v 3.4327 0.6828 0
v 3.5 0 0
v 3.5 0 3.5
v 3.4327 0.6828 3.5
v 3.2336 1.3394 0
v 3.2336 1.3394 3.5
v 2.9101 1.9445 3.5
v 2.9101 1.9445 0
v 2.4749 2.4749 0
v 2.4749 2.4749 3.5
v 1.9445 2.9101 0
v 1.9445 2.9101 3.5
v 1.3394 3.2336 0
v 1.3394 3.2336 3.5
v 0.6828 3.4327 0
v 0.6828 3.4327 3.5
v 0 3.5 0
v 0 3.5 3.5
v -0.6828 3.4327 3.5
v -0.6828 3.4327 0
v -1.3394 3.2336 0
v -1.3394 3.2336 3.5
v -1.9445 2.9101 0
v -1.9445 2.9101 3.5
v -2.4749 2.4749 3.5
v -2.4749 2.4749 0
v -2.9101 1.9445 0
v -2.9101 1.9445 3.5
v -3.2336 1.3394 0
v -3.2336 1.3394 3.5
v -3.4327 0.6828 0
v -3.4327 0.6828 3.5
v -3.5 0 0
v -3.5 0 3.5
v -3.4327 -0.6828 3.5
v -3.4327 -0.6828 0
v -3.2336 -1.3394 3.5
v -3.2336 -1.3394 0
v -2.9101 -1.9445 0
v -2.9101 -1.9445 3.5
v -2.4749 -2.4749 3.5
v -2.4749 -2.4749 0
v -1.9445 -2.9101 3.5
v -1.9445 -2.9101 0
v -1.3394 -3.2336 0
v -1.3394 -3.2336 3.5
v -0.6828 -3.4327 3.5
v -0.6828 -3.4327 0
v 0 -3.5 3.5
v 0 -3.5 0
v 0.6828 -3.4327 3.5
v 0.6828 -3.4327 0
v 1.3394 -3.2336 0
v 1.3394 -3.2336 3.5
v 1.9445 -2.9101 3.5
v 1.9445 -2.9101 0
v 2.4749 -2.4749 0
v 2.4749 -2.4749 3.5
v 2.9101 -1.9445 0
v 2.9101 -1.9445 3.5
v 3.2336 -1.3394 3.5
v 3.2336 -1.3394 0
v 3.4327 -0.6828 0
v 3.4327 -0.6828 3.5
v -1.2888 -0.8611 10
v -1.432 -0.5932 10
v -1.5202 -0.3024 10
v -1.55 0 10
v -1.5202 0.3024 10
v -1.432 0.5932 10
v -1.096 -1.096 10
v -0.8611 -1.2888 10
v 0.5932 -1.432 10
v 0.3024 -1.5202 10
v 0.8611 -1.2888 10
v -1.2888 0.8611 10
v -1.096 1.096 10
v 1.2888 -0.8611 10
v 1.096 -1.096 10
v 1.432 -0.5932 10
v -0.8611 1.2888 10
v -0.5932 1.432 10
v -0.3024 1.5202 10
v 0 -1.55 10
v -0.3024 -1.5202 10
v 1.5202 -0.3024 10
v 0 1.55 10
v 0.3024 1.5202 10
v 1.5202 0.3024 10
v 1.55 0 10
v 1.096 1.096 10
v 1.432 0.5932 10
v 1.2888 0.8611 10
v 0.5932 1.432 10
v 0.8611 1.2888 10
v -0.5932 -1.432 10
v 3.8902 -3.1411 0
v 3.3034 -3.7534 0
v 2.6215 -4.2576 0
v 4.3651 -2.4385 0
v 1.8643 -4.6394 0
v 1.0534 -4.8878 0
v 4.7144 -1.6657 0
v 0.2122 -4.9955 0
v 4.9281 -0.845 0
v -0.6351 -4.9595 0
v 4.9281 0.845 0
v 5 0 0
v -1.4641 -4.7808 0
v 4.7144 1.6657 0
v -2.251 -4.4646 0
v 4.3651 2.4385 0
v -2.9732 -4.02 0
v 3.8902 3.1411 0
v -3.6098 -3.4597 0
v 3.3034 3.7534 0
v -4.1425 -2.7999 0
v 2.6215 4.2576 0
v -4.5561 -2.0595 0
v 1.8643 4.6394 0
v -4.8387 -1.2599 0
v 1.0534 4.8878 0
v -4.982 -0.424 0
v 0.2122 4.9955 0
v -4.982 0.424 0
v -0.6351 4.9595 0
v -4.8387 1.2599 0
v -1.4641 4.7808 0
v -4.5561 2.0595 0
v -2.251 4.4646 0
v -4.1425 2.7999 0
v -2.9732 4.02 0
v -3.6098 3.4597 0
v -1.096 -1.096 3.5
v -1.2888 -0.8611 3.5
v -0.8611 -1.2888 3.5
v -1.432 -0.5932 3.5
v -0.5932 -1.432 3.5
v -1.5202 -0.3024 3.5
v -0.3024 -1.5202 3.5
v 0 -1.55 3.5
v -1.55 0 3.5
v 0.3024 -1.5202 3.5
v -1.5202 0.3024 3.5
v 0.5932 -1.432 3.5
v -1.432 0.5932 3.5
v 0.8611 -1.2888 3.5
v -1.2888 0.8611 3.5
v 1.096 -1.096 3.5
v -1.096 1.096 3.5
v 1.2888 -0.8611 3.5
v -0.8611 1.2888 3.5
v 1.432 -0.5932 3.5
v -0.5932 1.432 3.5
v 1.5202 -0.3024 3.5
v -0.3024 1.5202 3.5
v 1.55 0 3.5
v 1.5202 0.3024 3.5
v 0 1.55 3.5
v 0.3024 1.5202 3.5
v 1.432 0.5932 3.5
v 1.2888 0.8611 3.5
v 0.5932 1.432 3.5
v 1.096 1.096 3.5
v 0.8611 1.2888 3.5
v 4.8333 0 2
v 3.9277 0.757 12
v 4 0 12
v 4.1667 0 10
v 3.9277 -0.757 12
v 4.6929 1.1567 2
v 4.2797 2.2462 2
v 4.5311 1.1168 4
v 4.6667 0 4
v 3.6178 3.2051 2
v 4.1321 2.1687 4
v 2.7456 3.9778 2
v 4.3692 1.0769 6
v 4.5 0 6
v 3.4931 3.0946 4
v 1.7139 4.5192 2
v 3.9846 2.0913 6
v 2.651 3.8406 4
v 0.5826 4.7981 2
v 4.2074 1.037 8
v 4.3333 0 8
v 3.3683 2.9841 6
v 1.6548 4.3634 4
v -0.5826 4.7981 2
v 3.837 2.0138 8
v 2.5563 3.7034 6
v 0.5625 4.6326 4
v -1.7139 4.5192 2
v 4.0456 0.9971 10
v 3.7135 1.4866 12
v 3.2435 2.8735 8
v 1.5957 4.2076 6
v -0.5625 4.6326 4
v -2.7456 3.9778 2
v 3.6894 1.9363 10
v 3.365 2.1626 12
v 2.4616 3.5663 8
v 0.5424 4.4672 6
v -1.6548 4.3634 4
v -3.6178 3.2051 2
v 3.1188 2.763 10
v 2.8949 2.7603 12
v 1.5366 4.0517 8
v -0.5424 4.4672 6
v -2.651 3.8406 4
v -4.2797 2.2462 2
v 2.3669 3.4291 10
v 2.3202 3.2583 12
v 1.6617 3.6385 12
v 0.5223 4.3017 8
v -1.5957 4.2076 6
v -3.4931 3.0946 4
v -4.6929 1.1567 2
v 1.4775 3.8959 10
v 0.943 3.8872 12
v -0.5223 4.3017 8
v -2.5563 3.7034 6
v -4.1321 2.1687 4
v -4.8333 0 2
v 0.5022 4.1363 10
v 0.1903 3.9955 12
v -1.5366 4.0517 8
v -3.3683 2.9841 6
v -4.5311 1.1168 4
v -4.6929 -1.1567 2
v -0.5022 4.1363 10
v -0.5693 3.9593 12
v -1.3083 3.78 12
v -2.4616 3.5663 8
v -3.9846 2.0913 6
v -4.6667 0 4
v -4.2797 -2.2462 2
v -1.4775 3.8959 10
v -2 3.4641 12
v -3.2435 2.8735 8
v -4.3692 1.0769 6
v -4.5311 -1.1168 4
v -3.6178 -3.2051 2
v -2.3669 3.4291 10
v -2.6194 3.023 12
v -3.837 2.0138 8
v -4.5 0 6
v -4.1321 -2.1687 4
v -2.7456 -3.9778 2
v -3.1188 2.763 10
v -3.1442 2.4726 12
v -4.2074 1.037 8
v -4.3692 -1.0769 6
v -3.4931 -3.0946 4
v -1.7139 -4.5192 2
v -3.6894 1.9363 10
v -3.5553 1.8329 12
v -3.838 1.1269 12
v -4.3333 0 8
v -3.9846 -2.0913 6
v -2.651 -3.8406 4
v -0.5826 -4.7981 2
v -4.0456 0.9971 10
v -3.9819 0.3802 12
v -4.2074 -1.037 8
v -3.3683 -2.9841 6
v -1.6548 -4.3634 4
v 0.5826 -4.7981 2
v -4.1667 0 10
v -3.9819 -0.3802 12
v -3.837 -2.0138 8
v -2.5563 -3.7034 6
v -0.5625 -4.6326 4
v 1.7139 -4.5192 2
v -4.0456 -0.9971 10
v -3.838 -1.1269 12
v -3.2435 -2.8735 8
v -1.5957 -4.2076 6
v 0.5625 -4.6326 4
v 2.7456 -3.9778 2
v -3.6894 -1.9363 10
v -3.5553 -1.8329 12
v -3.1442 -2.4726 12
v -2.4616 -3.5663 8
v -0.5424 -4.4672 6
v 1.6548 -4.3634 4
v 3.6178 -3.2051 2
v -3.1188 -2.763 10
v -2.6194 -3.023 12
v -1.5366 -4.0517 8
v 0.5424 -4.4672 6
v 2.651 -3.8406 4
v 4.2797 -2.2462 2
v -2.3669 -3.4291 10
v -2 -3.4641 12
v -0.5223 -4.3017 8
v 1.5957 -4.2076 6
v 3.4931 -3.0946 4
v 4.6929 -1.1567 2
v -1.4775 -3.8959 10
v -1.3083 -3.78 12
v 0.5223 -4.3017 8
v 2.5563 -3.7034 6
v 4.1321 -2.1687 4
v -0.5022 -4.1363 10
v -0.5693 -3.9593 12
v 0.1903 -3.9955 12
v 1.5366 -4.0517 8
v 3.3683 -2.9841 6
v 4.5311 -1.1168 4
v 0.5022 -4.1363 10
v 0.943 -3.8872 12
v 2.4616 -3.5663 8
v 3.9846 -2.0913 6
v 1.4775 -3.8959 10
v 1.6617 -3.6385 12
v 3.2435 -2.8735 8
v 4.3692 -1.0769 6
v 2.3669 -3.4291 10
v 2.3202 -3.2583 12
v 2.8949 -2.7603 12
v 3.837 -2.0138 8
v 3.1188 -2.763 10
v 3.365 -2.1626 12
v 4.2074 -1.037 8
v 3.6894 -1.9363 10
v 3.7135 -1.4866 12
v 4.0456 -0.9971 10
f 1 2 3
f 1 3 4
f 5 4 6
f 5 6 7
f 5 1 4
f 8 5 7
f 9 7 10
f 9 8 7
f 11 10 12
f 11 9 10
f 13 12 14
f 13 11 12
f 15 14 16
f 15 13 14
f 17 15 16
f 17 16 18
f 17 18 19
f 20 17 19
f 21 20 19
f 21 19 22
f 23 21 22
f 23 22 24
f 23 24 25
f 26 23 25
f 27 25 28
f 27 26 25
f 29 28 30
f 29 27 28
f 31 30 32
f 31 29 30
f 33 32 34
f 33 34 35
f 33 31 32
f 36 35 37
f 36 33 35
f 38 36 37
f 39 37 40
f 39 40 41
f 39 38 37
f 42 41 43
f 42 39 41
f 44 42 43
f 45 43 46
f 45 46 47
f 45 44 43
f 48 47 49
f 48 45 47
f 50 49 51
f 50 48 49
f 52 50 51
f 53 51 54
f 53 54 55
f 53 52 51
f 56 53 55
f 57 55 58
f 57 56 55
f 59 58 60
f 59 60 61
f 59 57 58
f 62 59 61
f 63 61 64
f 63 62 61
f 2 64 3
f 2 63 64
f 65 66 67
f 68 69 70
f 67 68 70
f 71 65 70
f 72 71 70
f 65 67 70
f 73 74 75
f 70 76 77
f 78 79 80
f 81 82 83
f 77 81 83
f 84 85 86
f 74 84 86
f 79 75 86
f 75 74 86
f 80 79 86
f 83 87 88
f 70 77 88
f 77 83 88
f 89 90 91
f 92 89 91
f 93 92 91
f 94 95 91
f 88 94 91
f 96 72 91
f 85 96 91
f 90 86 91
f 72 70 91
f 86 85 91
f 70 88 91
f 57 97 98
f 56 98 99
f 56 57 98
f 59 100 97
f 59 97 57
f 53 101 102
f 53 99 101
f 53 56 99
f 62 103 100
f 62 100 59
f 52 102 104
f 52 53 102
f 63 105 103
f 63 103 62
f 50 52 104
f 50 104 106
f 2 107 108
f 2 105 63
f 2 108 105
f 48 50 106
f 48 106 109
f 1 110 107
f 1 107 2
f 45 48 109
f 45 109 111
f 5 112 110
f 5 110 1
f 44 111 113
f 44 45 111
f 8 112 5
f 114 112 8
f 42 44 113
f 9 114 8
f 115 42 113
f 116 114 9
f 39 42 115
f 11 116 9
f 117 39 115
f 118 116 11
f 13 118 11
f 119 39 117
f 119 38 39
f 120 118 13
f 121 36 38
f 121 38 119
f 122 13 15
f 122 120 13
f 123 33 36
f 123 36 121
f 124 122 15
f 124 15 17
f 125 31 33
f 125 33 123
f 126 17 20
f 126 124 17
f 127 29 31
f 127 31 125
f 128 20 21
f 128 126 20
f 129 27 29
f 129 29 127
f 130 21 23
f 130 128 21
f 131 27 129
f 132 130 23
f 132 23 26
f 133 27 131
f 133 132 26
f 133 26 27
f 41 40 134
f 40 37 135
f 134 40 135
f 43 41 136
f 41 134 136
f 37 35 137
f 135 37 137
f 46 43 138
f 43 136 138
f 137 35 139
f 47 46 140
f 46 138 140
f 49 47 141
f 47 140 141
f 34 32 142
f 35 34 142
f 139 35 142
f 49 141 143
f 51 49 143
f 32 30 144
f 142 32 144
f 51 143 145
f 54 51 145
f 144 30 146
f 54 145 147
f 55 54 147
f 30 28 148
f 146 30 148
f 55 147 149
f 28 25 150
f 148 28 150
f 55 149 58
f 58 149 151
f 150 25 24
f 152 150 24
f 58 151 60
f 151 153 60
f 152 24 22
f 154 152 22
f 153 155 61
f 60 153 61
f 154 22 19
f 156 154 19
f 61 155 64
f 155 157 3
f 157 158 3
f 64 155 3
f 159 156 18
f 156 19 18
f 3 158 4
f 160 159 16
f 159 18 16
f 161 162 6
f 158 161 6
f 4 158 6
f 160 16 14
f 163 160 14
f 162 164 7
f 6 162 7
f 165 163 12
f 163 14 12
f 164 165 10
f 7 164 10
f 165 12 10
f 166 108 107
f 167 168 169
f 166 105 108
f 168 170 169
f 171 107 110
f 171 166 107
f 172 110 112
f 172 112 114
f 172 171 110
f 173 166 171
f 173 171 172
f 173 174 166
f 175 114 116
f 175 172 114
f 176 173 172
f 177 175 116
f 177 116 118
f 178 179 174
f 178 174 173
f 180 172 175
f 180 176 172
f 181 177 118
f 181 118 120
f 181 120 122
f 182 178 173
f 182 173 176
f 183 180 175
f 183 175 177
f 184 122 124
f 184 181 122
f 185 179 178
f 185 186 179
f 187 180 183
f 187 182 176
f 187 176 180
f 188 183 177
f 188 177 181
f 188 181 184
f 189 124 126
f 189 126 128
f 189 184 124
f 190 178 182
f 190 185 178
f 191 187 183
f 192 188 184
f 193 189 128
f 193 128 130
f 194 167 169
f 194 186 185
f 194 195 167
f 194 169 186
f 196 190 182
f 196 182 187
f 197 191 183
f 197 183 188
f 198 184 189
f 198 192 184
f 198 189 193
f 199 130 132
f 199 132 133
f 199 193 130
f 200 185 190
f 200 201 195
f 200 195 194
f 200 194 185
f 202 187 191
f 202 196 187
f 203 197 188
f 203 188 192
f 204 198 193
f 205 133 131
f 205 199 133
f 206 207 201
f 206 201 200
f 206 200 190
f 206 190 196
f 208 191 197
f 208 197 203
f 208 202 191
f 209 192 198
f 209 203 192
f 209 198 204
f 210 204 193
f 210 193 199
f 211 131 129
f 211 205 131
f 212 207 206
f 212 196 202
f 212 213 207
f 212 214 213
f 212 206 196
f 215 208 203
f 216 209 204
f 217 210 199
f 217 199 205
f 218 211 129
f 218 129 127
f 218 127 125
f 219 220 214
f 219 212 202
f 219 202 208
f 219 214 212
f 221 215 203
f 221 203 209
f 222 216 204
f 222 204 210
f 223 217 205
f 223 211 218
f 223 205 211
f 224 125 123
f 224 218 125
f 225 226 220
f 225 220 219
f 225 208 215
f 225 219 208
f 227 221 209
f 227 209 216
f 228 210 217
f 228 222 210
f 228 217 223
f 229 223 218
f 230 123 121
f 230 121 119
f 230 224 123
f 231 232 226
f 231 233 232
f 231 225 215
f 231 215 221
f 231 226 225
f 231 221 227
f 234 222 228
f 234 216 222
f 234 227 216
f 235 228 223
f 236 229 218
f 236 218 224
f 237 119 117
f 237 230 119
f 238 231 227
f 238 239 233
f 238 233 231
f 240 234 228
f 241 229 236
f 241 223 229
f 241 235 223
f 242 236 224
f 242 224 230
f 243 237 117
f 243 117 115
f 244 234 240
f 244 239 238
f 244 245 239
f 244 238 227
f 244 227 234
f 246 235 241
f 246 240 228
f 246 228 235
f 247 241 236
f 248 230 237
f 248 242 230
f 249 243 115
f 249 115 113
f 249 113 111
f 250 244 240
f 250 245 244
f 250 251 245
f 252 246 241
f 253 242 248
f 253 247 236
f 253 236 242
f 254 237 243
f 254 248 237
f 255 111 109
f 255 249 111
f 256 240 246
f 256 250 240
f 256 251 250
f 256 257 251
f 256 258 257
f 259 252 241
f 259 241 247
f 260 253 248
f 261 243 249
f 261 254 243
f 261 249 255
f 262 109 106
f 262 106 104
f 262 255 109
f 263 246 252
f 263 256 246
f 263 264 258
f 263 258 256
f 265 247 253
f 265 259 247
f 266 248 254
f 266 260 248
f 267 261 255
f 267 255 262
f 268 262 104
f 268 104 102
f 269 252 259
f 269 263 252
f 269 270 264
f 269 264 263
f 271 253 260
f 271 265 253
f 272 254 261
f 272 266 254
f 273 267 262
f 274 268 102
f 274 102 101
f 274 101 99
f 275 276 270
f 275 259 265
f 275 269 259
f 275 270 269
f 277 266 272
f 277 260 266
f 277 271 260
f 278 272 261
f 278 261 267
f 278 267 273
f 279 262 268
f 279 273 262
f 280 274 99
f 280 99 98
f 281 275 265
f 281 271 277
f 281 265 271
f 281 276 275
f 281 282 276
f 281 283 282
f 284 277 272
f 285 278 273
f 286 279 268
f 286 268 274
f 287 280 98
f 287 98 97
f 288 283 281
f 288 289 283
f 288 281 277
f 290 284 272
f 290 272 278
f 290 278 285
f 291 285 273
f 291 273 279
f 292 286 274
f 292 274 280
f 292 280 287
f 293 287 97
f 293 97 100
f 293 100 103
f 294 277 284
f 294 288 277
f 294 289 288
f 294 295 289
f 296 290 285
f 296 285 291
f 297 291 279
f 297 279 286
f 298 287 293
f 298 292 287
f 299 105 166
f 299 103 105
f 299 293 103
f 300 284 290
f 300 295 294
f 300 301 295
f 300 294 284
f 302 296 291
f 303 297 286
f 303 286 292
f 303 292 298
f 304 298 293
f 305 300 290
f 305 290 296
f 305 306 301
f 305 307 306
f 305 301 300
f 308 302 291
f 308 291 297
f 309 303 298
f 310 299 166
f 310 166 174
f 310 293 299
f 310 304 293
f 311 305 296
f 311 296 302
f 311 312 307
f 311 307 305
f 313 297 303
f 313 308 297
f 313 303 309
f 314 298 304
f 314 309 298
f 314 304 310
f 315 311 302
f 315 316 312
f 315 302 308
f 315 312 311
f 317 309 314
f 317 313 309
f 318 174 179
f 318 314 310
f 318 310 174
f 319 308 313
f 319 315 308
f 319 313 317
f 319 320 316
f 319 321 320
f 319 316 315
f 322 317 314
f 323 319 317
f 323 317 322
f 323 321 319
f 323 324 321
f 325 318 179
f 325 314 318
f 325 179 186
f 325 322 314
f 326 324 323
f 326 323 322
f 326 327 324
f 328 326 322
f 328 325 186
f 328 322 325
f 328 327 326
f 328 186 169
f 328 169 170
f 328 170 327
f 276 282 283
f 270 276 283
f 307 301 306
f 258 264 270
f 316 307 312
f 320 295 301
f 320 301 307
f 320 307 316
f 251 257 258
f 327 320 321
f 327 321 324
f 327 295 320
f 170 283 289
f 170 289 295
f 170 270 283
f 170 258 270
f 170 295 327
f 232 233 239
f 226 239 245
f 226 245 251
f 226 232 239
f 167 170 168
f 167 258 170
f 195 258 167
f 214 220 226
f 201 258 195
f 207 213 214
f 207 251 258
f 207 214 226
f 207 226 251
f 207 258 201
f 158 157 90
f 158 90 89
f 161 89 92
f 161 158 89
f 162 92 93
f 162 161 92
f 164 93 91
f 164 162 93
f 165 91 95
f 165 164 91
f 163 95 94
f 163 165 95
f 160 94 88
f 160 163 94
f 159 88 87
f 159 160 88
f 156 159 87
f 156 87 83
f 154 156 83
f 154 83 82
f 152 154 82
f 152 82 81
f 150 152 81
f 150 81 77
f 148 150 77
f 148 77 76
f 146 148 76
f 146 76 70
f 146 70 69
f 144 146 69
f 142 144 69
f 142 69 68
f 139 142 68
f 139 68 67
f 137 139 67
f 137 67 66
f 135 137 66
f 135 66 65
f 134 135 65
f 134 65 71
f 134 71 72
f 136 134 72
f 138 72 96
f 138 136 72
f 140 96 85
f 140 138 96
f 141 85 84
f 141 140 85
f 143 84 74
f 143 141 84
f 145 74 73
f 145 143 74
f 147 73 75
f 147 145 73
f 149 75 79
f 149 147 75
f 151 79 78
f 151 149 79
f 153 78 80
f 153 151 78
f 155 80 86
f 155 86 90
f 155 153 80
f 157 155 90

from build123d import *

# Parameters (mm, degrees)
CYLINDER004_R     = 1.55
CYLINDER004_DEPTH = 10
CYLINDER003_R     = 3.5
CYLINDER003_DEPTH = 3.5


with BuildPart() as bolt_hole_cylinder:
    # Cylinder004 → Cylinder004 (new body)
    with BuildSketch(Plane.XY):
        Circle(CYLINDER004_R)
    extrude(amount=CYLINDER004_DEPTH)


with BuildPart() as hole_extraction:
    # Cylinder003 → Cylinder003 (new body)
    with BuildSketch(Plane.XY):
        Circle(CYLINDER003_R)
    extrude(amount=CYLINDER003_DEPTH)

    # Fusion003: union bolt hole cylinder
    add(bolt_hole_cylinder.part)


with BuildPart() as bolt_cover:
    # Cone → Cone (revolve)
    with BuildSketch(Plane.XZ):
        Polygon((0, 0), (5, 0), (4, 12), (0, 12), align=None)
    revolve(axis=Axis((0, 0, 0), (0, 0, 1)))

    # Cut001: cut hole extraction
    add(hole_extraction.part, mode=Mode.SUBTRACT)


solid = bolt_cover.part
